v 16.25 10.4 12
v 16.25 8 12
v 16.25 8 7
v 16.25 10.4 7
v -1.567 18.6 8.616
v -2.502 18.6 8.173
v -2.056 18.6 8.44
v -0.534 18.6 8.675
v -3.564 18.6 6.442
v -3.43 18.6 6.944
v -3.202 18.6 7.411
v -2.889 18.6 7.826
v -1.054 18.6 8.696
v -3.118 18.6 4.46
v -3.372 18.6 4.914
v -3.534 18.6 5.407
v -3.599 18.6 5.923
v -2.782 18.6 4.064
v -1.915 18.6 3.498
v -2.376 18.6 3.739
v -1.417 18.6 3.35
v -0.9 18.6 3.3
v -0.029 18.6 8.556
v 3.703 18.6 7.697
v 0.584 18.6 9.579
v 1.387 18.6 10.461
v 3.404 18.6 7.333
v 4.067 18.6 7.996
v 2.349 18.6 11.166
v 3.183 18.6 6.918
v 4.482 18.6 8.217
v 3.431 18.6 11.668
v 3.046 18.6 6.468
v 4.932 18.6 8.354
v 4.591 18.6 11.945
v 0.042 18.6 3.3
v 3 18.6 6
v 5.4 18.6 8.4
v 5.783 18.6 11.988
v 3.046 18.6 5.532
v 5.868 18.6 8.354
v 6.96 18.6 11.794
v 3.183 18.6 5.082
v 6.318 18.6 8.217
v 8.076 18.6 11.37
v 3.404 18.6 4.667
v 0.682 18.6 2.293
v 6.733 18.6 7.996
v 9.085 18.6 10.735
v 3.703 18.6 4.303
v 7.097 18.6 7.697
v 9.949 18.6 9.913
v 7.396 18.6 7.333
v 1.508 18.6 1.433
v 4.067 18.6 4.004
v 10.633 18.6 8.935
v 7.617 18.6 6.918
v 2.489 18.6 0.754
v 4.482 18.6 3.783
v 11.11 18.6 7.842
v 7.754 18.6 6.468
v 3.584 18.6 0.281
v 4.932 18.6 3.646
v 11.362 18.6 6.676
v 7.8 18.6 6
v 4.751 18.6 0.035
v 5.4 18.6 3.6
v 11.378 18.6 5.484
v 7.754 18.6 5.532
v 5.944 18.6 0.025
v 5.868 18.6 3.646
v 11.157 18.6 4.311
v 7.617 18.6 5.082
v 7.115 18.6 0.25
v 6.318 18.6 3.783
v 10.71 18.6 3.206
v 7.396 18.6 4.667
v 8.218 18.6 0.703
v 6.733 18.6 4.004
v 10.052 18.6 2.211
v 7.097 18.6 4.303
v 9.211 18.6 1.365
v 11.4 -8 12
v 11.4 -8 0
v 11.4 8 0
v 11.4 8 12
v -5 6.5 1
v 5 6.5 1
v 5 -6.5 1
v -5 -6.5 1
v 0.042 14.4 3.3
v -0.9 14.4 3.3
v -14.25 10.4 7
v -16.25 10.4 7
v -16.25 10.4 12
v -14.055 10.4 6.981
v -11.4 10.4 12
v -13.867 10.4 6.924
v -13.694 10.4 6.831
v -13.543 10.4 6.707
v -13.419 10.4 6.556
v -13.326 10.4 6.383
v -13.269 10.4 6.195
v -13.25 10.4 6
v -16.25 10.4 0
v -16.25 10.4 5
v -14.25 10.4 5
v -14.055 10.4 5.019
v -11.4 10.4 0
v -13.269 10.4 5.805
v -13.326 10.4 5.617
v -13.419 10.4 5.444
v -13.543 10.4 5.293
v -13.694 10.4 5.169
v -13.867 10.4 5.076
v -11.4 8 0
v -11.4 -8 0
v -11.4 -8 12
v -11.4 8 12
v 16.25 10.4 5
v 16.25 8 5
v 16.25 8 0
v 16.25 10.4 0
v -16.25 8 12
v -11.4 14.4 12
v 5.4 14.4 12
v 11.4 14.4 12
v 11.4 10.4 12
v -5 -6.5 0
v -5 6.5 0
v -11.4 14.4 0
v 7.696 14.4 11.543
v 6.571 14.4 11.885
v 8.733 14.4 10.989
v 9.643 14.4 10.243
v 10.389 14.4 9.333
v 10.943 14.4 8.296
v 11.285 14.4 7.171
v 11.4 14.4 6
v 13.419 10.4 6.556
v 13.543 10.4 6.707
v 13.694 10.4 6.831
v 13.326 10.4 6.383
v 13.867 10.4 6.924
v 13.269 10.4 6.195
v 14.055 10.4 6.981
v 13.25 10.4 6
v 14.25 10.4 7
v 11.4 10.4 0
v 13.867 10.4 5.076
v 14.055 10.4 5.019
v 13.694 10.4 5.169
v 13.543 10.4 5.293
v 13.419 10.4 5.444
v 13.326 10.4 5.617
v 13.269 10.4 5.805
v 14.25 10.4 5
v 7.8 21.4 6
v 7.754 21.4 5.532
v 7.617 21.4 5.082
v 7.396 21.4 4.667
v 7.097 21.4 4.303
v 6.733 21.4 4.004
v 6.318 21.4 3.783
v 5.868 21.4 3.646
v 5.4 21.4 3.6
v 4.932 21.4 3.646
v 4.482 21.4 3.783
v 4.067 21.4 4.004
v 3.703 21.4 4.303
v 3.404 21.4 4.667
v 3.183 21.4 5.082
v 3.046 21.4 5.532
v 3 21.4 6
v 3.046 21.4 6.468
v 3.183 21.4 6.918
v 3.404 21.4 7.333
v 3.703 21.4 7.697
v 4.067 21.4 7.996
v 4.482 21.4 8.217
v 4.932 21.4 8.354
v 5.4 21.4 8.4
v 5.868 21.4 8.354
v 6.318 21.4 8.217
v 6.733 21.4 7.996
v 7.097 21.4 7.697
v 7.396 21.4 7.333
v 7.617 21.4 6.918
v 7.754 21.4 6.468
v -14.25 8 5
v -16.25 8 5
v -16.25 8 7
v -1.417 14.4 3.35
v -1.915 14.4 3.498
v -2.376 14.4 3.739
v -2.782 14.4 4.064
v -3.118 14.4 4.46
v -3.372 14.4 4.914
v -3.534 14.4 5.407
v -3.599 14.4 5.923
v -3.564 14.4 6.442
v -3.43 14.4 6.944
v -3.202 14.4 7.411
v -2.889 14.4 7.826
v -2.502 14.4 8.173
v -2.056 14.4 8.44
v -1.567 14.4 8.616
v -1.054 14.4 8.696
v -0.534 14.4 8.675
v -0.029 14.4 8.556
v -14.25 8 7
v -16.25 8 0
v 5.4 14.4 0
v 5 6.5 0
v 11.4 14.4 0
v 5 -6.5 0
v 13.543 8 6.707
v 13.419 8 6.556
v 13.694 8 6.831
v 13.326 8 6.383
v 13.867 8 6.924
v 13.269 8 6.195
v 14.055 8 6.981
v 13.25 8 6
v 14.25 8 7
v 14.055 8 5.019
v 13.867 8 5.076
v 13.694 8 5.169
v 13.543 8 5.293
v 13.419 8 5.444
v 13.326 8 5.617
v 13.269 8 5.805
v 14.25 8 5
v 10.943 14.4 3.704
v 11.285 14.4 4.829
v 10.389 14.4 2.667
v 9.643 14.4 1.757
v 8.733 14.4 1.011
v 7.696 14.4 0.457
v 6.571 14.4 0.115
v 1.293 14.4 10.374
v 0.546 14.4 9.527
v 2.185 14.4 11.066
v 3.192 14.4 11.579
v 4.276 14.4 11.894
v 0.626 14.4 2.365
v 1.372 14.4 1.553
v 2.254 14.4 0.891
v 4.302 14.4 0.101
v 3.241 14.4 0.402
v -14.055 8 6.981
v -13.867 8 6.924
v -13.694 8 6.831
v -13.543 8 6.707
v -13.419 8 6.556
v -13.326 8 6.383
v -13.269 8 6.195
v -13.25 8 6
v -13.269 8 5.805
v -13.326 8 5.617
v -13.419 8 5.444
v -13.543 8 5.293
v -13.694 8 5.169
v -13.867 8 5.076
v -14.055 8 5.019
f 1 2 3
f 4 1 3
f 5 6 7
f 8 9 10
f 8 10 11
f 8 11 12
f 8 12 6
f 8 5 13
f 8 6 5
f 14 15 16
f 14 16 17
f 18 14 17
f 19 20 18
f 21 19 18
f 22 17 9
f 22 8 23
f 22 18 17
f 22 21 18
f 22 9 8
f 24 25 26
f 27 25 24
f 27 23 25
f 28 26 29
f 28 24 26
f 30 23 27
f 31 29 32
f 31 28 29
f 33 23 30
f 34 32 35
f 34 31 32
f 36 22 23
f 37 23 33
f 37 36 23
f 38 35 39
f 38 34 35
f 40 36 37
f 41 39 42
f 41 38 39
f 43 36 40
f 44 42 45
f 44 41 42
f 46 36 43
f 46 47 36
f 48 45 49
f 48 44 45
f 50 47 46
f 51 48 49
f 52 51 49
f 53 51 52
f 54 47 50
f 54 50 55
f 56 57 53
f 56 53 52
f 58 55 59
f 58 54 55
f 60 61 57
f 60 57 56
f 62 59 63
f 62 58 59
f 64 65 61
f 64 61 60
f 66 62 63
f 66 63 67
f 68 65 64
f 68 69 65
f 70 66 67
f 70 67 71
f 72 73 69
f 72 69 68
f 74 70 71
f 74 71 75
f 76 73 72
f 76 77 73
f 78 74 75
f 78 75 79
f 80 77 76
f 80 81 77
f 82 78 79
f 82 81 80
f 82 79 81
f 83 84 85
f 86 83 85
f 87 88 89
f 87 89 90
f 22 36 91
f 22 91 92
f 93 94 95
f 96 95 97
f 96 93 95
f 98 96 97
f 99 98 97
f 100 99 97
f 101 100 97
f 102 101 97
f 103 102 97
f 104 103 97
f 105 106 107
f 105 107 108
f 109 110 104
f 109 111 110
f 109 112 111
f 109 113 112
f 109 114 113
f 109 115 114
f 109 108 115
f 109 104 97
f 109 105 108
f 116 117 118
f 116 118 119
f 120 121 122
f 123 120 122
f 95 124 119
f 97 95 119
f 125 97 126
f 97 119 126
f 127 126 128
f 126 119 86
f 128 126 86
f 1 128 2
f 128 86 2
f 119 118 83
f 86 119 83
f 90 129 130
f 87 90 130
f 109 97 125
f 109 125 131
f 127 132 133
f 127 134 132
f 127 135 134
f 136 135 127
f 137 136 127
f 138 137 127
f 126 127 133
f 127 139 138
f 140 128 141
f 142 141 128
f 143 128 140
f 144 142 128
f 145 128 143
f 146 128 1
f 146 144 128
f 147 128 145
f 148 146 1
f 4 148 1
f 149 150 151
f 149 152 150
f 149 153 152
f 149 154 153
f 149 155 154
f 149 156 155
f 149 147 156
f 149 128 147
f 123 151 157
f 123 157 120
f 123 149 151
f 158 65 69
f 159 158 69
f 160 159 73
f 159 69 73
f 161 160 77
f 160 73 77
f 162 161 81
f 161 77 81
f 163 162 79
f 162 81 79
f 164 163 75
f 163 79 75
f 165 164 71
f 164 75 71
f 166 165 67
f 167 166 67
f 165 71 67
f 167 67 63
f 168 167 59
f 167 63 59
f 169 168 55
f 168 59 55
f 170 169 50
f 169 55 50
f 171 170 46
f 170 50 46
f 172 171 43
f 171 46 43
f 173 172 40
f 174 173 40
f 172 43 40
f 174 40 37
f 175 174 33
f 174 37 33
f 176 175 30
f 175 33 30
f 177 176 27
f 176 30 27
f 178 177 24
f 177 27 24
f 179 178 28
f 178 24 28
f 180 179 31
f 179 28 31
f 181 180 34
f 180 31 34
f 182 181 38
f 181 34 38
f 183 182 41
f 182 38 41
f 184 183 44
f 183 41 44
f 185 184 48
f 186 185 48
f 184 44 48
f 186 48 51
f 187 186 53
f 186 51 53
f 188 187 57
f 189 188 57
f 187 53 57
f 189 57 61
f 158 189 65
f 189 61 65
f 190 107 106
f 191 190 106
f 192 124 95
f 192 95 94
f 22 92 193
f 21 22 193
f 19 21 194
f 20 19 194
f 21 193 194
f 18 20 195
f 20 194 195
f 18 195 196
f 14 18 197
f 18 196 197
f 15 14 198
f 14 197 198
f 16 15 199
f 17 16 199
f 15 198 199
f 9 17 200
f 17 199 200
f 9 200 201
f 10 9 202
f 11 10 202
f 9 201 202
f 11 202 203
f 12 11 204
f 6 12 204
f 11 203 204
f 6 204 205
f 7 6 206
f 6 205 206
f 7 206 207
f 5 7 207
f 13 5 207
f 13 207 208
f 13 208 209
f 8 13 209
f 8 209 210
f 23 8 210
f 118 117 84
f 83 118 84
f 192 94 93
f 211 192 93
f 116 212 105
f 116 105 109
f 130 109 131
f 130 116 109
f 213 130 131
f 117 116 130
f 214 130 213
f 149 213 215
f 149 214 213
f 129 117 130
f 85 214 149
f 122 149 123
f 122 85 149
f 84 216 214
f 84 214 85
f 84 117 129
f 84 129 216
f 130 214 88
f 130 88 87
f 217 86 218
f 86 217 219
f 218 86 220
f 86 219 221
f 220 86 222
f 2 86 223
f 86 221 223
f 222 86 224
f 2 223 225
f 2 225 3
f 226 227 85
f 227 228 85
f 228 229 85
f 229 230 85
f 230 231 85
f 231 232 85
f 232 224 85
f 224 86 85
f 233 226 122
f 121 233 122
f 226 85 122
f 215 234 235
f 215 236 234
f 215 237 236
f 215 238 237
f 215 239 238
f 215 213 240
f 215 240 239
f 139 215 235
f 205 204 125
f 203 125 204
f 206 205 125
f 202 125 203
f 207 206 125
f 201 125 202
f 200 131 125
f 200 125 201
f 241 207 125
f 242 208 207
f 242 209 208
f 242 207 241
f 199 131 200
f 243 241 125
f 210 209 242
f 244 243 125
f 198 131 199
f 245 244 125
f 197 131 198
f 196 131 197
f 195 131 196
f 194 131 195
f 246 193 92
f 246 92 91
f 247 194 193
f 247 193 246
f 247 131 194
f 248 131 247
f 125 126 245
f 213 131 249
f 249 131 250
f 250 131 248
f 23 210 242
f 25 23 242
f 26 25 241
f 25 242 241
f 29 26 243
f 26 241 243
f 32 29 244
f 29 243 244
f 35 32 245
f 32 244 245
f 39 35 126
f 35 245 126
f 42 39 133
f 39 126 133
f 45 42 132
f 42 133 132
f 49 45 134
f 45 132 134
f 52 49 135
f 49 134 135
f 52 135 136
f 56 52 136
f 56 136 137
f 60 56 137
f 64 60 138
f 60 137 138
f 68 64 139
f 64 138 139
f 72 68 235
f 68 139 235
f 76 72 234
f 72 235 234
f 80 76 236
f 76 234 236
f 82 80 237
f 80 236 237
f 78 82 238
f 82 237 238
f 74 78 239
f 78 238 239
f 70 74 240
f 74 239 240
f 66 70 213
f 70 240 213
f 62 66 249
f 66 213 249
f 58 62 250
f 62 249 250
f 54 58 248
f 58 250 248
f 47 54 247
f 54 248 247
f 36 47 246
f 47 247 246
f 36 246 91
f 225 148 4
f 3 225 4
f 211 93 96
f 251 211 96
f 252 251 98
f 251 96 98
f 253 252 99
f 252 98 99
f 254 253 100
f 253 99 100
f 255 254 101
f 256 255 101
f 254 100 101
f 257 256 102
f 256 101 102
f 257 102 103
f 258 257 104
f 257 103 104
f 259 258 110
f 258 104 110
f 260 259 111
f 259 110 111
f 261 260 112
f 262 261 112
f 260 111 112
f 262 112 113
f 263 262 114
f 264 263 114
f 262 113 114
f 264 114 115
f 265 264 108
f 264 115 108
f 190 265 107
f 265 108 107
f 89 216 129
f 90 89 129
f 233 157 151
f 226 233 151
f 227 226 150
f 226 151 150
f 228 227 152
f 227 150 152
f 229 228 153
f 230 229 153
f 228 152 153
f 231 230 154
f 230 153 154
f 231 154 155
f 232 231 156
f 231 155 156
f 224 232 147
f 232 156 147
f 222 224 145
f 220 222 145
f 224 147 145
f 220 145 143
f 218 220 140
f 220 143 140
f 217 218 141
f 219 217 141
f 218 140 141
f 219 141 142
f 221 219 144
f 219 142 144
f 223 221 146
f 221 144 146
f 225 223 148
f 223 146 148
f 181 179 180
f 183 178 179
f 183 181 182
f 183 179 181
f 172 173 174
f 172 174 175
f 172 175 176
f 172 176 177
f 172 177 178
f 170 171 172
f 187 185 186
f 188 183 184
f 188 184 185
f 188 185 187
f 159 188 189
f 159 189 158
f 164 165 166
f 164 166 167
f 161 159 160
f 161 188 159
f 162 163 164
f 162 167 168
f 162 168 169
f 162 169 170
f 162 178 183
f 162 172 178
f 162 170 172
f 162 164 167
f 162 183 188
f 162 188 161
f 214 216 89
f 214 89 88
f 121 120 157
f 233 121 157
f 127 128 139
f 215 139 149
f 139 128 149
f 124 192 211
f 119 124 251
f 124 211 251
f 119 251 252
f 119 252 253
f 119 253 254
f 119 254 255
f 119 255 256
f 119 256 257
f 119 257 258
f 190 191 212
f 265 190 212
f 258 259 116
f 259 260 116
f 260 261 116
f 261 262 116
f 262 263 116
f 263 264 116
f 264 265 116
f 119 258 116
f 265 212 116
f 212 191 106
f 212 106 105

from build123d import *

# Parameters (mm, degrees)
SKETCH1_W           = 22.8
SKETCH1_H           = 16
BOSS_EXTRUDE1_DEPTH = 12
SKETCH2_W           = 32.5
SKETCH2_H           = 12
MOUNTING_DEPTH      = 2.4
SKETCH4_W           = 22.8
SKETCH4_H           = 12
BOSS_EXTRUDE4_DEPTH = 4
SKETCH6_R           = 2.7
SKETCH6_R_2         = 6
BOSS_EXTRUDE5_DEPTH = 4.2
SKETCH7_R           = 2.4
BOSS_EXTRUDE6_DEPTH = 2.8
SKETCH8_R           = 1
CUT_EXTRUDE1_DEPTH  = 2.8
SKETCH9_W           = 10
SKETCH9_H           = 13
CUT_EXTRUDE2_DEPTH  = 1


with BuildPart() as part:
    # Sketch1 → Boss-Extrude1 (new body)
    with BuildSketch(Plane.XY):
        Rectangle(SKETCH1_W, SKETCH1_H)
    extrude(amount=BOSS_EXTRUDE1_DEPTH)

    # Sketch2 → mounting (add)
    with BuildSketch(Plane(origin=(0, 8, 0), x_dir=(1, 0, 0), z_dir=(0, 1, 0))):
        with Locations((0, -6)):
            Rectangle(SKETCH2_W, SKETCH2_H)
    extrude(amount=MOUNTING_DEPTH)

    # Sketch4 → Boss-Extrude4 (add)
    with BuildSketch(Plane(origin=(0, 10.4, 0), x_dir=(1, 0, 0), z_dir=(0, 1, 0))):
        with Locations((0, -6)):
            Rectangle(SKETCH4_W, SKETCH4_H)
    extrude(amount=BOSS_EXTRUDE4_DEPTH)

    # Sketch6 → Boss-Extrude5 (add)
    with BuildSketch(Plane(origin=(0, 14.4, 0), x_dir=(1, 0, 0), z_dir=(0, 1, 0))):
        with Locations((-0.9, -6)):
            Circle(SKETCH6_R)
        with Locations((5.4, -6)):
            Circle(SKETCH6_R_2)
        with BuildLine():
            Line((0.04182867, -3.3), (-0.9, -3.3))
            ThreePointArc((-0.9, -3.3), (-0.458336611, -3.336368372), (-0.028571429, -3.44449374))
            ThreePointArc((-0.028571429, -3.44449374), (0.006144751, -3.37201112), (0.04182867, -3.3))
        make_face()
    extrude(amount=BOSS_EXTRUDE5_DEPTH)

    # Sketch7 → Boss-Extrude6 (add)
    with BuildSketch(Plane(origin=(0, 18.6, 0), x_dir=(1, 0, 0), z_dir=(0, 1, 0))):
        with Locations((5.4, -6)):
            Circle(SKETCH7_R)
    extrude(amount=BOSS_EXTRUDE6_DEPTH)

    # Sketch8 → Cut-Extrude1 (cut)
    with BuildSketch(Plane(origin=(0, 10.4, 0), x_dir=(1, 0, 0), z_dir=(0, 1, 0))):
        with Locations((-14.25, -6)):
            Circle(SKETCH8_R)
        with BuildLine():
            ThreePointArc((-14.25, -7), (-15.25, -6), (-14.25, -5))
            Line((-14.25, -5), (-16.25, -5))
            Line((-16.25, -5), (-16.25, -7))
            Line((-16.25, -7), (-14.25, -7))
        make_face()
        with BuildLine():
            ThreePointArc((15.25, -6), (14.957106781, -6.707106781), (14.25, -7))
            Line((14.25, -7), (16.25, -7))
            Line((16.25, -7), (16.25, -5))
            Line((16.25, -5), (14.25, -5))
            ThreePointArc((14.25, -5), (14.957106781, -5.292893219), (15.25, -6))
        make_face()
        with Locations((14.25, -6)):
            Circle(SKETCH8_R)
    extrude(amount=-CUT_EXTRUDE1_DEPTH, mode=Mode.SUBTRACT)

    # Sketch9 → Cut-Extrude2 (cut)
    with BuildSketch(Plane(origin=(0, 0, 0), x_dir=(-1, 0, 0), z_dir=(0, 0, -1))):
        Rectangle(SKETCH9_W, SKETCH9_H)
    extrude(amount=-CUT_EXTRUDE2_DEPTH, mode=Mode.SUBTRACT)


solid = part.part
